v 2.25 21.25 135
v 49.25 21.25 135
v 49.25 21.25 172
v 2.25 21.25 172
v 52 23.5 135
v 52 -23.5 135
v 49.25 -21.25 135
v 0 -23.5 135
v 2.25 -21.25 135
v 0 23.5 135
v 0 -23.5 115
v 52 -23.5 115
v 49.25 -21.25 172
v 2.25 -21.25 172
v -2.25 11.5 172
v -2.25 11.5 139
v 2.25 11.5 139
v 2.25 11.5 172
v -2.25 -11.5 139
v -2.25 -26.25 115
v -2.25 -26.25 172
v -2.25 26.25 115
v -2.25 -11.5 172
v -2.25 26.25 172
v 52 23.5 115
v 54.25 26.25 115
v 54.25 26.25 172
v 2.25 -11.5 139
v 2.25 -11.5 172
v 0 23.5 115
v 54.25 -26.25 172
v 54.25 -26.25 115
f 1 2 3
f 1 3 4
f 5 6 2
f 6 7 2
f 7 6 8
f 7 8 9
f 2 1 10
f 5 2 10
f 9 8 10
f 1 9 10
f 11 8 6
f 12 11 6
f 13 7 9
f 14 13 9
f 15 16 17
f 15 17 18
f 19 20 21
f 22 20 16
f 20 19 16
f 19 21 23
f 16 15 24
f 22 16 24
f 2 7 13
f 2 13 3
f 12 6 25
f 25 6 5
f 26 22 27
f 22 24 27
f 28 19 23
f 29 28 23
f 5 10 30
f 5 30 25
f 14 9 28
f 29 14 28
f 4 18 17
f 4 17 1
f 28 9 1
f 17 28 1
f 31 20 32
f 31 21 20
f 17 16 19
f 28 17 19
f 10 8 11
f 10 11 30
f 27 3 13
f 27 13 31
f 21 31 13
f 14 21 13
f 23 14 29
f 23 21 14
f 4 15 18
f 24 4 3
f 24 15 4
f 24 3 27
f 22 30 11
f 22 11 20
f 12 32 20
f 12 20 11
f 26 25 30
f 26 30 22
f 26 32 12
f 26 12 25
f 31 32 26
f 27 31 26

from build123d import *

# Parameters (mm, degrees)
SKETCH133_W             = 52.5
SKETCH133_H             = 56.5
SKETCH133_W_2           = 42.5
SKETCH133_H_2           = 47
PAD067_DEPTH            = 37
SKETCH131_W             = 23
SKETCH131_H             = 33
POCKET057_DEPTH         = 5
SKETCH135_W             = 52.5
SKETCH135_H             = 56.5
SKETCH135_W_2           = 47
SKETCH135_H_2           = 52
PAD066_DEPTH            = 20
BODY037_PLACEMENT_ANGLE = 90


with BuildPart() as part:
    # Sketch133 → Pad067 (new body)
    with BuildSketch(Plane.XY):
        with Locations((0, -26)):
            Rectangle(SKETCH133_W, SKETCH133_H)
        with Locations((0, -25.75)):
            Rectangle(SKETCH133_W_2, SKETCH133_H_2, mode=Mode.SUBTRACT)
    extrude(amount=PAD067_DEPTH)

    # Sketch131 (on Face1 of Pad067) → Pocket057 (cut)
    with BuildSketch(Plane(origin=(0, 2.25, 0), x_dir=(-1, 0, 0), z_dir=(0, 1, 0))):
        with Locations((0, 20.5)):
            Rectangle(SKETCH131_W, SKETCH131_H)
    extrude(amount=-POCKET057_DEPTH, mode=Mode.SUBTRACT)

    # Sketch135 (on Face2 of Pocket057) → Pad066 (join)
    with BuildSketch(Plane(origin=(0, 0, 0), x_dir=(1, 0, 0), z_dir=(0, 0, -1))):
        with Locations((0, 26)):
            Rectangle(SKETCH135_W, SKETCH135_H)
        with Locations((0, 26)):
            Rectangle(SKETCH135_W_2, SKETCH135_H_2, mode=Mode.SUBTRACT)
    extrude(amount=PAD066_DEPTH)


with BuildPart() as part_1:
    # Body037 placement: moved
    add(part.part.moved(Location((0, 0, 135))).rotate(Axis((0, 0, 135), (0, 0, 1)), BODY037_PLACEMENT_ANGLE))


solid = part_1.part
